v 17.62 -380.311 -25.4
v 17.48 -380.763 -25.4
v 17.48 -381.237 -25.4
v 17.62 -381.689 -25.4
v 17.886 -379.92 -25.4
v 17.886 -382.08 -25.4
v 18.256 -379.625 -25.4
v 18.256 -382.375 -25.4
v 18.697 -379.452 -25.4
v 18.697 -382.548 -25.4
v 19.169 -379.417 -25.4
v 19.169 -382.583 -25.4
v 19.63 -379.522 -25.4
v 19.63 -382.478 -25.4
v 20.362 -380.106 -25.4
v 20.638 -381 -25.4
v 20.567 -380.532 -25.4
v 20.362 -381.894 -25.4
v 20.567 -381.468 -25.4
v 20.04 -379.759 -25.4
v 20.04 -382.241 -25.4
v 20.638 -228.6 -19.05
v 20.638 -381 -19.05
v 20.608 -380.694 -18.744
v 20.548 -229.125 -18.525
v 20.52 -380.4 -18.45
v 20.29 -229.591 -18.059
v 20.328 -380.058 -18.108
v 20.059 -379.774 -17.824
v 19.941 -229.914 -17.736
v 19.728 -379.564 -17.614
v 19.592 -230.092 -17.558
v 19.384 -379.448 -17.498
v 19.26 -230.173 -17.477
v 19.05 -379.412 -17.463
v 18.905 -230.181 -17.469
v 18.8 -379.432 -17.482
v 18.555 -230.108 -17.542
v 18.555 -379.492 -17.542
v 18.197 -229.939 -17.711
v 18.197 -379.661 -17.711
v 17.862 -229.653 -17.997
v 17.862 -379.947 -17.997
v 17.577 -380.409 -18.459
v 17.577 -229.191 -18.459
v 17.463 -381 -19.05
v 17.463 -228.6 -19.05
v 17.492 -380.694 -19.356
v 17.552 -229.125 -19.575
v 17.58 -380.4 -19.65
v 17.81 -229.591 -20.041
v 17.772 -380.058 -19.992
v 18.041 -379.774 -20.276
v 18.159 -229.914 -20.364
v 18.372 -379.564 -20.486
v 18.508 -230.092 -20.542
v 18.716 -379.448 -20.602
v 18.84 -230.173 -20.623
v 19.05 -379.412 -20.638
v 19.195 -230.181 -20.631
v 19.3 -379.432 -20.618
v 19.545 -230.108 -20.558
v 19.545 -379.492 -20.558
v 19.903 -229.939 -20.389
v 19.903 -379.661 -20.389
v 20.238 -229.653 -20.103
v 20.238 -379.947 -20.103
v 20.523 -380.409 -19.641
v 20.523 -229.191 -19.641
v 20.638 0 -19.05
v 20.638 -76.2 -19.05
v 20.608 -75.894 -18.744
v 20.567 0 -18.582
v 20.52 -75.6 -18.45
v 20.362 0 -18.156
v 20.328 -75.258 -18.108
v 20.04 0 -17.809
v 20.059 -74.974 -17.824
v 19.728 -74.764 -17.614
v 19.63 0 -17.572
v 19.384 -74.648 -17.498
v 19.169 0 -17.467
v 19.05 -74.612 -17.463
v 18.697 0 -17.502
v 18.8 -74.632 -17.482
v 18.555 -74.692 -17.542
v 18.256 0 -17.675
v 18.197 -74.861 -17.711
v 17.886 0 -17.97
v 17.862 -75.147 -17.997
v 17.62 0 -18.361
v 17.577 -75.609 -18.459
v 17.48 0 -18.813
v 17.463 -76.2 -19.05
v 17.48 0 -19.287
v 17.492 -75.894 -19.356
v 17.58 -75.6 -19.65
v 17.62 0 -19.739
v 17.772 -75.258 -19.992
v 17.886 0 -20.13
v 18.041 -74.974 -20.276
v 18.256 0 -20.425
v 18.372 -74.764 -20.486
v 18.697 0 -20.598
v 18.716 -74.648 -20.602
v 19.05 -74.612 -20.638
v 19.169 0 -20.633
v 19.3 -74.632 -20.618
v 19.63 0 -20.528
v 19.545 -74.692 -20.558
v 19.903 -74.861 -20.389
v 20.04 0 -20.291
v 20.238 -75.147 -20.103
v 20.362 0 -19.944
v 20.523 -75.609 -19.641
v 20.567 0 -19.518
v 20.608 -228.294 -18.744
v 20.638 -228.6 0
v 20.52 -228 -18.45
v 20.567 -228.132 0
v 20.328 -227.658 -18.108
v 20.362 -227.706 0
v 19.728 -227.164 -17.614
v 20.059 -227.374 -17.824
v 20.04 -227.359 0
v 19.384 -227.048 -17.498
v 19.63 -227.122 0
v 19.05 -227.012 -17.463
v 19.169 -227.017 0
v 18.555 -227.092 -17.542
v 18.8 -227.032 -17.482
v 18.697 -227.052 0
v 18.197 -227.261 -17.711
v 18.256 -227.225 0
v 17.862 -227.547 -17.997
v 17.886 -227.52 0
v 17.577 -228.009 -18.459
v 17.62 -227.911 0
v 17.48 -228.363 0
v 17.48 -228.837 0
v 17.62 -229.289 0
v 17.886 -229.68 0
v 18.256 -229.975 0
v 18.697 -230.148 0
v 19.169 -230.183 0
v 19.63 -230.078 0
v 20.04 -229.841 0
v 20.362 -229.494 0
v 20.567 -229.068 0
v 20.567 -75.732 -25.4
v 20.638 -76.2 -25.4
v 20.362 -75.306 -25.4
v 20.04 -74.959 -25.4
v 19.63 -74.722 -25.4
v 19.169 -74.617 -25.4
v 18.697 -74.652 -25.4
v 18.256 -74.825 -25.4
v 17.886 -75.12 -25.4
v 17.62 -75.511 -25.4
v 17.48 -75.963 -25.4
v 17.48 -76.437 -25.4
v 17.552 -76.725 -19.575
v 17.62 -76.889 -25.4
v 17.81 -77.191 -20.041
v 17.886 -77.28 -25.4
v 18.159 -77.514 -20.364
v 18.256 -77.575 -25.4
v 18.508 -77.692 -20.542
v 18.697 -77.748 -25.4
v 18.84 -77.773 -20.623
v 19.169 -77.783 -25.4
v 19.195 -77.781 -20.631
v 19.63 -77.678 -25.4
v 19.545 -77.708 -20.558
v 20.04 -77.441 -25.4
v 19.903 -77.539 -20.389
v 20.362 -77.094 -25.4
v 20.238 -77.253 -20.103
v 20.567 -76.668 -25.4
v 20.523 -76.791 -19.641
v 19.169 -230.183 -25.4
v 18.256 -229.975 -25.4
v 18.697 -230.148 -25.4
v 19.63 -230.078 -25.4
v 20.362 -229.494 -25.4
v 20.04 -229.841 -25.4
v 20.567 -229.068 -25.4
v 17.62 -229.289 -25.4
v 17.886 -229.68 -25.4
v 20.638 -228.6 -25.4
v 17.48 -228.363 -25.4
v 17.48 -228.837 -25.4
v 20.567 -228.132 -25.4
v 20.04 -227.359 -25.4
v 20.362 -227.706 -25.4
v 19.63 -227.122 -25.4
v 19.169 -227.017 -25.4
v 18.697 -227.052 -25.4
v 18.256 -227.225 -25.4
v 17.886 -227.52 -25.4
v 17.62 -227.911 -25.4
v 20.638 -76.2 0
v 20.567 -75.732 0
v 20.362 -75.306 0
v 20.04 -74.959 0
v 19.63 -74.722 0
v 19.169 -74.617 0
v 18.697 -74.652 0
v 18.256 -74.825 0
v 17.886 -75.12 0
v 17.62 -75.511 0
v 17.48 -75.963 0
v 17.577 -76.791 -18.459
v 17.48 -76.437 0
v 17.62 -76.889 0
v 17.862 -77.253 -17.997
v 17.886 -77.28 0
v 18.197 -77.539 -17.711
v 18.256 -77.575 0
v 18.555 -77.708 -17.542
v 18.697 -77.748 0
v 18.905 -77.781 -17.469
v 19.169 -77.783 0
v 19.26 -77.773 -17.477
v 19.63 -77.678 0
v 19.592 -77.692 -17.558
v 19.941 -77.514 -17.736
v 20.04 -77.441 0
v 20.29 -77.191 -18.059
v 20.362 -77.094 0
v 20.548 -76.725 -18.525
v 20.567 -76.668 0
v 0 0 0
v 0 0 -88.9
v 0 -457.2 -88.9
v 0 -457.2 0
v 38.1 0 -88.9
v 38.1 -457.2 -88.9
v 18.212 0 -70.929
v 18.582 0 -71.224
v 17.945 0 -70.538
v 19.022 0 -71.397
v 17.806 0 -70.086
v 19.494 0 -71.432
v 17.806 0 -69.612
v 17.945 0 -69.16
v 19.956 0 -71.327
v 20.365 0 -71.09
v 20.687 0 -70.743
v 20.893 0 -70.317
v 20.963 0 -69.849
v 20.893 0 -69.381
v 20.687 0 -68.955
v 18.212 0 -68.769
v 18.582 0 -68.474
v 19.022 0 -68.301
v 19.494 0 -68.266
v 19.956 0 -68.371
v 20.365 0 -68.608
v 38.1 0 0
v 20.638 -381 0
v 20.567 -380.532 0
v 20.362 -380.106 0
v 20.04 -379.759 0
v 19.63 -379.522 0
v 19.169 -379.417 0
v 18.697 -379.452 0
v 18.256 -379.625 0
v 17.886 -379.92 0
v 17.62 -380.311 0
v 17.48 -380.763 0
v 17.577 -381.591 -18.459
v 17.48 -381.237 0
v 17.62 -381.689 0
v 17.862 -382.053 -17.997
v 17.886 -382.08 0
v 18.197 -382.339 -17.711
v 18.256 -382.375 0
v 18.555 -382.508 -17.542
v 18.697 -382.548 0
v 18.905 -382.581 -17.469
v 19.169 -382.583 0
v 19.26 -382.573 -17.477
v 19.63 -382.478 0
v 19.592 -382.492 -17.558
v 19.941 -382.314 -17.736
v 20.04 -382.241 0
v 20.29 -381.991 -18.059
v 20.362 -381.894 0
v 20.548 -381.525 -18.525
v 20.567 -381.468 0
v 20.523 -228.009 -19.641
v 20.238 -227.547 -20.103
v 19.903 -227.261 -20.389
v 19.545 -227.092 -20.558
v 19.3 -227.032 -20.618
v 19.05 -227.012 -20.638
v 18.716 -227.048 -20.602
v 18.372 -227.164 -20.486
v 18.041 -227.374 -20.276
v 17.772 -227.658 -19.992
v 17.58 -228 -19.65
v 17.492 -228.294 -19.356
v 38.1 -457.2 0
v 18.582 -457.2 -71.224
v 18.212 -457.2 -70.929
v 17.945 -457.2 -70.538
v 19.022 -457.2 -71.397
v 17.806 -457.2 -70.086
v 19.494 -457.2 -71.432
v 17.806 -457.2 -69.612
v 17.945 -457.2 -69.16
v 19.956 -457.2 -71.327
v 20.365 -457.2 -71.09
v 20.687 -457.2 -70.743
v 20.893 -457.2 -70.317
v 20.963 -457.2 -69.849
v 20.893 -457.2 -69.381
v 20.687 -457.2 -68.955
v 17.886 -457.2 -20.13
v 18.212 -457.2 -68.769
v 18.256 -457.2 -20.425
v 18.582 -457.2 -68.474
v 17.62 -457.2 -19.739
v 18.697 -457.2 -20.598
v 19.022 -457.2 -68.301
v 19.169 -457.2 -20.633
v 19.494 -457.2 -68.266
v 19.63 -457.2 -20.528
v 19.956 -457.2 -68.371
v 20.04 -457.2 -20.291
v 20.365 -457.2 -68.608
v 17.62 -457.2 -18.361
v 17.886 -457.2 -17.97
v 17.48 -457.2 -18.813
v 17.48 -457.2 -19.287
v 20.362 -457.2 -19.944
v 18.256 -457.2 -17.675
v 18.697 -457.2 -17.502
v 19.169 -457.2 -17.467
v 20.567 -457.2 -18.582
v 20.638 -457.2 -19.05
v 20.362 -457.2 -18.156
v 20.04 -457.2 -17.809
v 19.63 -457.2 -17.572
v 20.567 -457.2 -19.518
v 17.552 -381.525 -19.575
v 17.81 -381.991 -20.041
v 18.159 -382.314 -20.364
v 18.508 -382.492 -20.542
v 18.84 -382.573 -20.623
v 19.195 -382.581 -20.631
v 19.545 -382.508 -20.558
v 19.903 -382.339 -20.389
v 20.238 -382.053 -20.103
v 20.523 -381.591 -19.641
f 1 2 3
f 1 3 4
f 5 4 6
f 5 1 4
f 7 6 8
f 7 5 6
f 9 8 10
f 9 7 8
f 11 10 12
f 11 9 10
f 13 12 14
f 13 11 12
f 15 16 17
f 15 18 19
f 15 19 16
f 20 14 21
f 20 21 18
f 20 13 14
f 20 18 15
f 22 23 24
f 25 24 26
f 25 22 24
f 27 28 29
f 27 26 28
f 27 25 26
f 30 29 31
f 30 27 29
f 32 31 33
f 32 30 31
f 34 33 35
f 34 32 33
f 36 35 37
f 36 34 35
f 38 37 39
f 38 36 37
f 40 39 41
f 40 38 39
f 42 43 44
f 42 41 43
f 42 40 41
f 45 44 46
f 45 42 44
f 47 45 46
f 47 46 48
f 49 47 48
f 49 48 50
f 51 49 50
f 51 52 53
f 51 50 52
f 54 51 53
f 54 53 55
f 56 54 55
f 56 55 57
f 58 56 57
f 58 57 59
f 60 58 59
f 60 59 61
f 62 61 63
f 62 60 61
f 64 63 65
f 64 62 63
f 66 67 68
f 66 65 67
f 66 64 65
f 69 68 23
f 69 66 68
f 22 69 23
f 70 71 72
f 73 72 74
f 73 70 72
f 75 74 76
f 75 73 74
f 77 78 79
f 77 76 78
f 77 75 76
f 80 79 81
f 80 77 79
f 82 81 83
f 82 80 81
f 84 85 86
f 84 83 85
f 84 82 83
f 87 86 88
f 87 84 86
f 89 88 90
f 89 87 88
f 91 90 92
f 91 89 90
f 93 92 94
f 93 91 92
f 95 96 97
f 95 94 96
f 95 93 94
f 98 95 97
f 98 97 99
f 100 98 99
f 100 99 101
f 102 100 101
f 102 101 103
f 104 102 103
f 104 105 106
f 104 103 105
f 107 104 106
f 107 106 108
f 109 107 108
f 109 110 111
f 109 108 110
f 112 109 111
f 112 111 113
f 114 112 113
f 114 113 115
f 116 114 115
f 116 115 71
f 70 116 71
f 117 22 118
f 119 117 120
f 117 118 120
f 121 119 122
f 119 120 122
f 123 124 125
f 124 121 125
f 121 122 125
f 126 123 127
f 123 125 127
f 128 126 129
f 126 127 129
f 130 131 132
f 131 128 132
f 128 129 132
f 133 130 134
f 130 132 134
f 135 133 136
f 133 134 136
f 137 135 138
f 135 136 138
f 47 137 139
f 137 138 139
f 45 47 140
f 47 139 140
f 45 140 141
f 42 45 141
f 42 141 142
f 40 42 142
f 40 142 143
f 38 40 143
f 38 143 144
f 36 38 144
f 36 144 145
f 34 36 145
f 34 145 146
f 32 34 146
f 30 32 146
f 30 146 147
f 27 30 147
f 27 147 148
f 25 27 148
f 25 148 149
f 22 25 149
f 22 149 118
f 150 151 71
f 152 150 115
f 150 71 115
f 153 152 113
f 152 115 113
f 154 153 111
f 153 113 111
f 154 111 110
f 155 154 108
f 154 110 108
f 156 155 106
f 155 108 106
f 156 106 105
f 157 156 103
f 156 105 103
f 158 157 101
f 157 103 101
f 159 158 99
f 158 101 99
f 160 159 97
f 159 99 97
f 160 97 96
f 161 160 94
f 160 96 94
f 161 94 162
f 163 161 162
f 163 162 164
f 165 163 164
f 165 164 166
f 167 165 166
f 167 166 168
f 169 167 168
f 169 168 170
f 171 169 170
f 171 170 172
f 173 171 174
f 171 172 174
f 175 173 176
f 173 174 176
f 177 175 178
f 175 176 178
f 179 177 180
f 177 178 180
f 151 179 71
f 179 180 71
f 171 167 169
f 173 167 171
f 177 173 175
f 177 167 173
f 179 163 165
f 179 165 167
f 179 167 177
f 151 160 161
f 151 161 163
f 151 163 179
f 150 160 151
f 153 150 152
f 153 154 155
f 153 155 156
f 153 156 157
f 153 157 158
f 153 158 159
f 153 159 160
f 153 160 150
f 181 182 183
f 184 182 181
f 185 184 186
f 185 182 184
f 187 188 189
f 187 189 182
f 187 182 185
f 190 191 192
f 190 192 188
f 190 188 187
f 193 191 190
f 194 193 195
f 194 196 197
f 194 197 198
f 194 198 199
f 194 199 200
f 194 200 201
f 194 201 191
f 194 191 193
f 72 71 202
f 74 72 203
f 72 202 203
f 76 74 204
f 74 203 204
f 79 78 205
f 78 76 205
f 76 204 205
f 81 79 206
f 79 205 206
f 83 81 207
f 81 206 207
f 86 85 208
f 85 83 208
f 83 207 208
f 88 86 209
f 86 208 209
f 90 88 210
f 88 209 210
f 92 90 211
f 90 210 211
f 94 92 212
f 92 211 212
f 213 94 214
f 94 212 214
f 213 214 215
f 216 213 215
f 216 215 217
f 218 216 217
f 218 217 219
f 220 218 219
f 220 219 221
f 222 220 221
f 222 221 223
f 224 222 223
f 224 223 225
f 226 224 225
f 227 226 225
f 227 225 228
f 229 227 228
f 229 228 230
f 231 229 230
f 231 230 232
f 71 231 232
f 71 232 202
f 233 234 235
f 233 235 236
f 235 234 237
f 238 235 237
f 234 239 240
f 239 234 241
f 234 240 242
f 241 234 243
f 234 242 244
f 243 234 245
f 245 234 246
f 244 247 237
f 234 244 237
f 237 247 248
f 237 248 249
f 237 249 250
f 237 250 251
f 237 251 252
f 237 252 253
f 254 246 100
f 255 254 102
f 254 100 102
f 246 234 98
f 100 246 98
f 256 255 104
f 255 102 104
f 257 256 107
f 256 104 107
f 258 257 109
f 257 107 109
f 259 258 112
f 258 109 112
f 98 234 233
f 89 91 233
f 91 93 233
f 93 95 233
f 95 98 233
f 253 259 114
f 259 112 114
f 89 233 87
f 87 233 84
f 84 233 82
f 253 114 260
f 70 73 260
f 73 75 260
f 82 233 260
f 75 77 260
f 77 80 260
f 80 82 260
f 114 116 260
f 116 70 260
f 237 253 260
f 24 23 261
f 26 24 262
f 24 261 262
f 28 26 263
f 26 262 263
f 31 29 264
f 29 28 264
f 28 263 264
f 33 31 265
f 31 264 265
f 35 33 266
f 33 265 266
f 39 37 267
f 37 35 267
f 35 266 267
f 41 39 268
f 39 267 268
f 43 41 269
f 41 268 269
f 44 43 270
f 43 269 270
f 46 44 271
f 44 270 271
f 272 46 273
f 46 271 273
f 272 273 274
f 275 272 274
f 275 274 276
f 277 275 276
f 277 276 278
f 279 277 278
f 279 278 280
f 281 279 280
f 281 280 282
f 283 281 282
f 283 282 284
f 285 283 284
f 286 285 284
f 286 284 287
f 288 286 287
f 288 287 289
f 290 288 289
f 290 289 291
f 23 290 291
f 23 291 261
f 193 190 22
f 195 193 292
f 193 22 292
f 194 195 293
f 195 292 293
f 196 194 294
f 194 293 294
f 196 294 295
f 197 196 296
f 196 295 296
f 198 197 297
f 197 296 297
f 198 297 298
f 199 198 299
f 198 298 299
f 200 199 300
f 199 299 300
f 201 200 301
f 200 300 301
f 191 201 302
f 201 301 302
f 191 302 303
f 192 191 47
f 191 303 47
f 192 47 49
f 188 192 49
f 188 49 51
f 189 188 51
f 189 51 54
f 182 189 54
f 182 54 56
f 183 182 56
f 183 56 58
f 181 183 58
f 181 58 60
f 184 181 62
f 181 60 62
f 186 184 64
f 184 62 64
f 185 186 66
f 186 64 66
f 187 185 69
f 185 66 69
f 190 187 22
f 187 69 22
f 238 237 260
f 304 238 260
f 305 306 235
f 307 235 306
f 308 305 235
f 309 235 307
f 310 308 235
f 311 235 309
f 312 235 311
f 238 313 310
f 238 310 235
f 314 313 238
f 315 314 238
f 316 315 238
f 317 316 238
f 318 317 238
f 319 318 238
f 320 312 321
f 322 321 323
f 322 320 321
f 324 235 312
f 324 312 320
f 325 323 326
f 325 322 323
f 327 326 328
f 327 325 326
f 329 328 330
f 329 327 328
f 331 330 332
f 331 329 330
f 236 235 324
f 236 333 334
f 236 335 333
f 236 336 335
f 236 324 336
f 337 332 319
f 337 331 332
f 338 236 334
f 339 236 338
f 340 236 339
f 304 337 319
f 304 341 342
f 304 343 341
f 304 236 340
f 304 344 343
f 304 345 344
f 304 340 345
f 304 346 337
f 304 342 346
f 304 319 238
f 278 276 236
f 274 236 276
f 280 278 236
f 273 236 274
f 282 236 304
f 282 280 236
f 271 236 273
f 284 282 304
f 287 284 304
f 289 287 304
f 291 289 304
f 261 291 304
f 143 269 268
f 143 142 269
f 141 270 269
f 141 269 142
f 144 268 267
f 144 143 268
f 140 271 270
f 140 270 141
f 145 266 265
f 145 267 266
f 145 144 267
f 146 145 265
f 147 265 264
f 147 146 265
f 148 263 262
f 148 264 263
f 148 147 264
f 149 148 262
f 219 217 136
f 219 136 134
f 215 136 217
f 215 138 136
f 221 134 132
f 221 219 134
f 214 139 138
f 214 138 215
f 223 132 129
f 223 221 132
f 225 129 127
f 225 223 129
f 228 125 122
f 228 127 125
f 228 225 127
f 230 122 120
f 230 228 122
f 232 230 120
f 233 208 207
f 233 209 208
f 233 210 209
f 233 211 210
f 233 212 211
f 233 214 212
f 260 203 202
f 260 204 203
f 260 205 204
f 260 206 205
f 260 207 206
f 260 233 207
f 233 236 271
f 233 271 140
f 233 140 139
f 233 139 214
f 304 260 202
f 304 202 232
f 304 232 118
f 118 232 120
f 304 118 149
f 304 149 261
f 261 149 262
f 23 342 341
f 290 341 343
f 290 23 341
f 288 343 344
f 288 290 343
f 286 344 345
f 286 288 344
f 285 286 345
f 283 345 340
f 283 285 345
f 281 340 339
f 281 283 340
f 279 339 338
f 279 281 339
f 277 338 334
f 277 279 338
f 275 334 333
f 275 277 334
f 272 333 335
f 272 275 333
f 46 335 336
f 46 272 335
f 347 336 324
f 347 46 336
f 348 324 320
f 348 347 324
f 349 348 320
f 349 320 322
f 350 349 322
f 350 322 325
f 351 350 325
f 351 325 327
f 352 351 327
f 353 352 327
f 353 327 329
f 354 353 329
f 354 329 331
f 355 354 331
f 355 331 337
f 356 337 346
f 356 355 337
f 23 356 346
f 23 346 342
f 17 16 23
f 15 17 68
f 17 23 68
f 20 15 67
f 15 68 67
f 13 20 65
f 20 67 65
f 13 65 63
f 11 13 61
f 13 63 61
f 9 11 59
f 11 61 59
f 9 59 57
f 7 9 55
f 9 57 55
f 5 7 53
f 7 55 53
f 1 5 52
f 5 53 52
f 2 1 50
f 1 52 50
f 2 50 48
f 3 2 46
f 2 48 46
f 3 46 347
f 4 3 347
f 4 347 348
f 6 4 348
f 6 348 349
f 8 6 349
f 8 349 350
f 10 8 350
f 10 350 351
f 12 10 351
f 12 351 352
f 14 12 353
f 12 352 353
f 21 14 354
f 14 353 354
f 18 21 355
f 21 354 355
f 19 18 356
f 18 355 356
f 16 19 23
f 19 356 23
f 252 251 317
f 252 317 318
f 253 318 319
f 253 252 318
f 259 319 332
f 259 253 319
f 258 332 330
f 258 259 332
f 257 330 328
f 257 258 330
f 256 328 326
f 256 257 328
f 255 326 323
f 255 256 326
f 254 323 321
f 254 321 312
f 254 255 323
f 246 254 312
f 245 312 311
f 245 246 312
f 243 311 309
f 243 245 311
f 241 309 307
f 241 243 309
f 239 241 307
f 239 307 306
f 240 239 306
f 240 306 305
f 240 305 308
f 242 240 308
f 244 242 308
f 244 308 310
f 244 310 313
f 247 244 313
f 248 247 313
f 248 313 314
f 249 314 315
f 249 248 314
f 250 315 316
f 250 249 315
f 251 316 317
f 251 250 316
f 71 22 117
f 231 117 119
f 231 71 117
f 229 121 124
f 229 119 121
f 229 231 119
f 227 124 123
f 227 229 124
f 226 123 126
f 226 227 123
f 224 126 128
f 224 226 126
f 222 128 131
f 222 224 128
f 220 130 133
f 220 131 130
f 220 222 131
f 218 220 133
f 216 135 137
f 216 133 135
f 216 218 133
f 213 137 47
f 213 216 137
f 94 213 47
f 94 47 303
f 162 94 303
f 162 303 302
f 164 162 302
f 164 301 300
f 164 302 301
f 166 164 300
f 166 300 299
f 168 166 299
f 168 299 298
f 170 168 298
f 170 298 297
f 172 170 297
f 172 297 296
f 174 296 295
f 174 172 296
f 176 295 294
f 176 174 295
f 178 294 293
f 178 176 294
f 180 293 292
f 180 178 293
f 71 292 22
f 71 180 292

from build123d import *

# Parameters (mm, degrees)
F0_W     = 38.1
F0_H     = 88.9
F1_DEPTH = 457.2
F2_R     = 1.5875
F3_DEPTH = 457.2
F4_R     = 1.5875
F5_DEPTH = 25.4


with BuildPart() as f1:
    # F0 (on Front) → F1 (new body)
    with BuildSketch(Plane.XZ):
        with Locations((19.05, -44.45)):
            Rectangle(F0_W, F0_H)
    extrude(amount=F1_DEPTH)

    # F2 (on Front) → F3 (cut)
    with BuildSketch(Plane.XZ):
        with Locations((19.05, -19.05)):
            Circle(F2_R)
        with Locations((19.375634, -69.848956)):
            Circle(F2_R)
    extrude(amount=F3_DEPTH, mode=Mode.SUBTRACT)

    # F4 (on Top) → F5 (cut)
    with BuildSketch(Plane.XY):
        with Locations((19.05, -76.2)):
            Circle(F4_R)
        with Locations((19.05, -228.6)):
            Circle(F4_R)
        with Locations((19.05, -381)):
            Circle(F4_R)
    extrude(amount=-F5_DEPTH, mode=Mode.SUBTRACT)


solid = f1.part
